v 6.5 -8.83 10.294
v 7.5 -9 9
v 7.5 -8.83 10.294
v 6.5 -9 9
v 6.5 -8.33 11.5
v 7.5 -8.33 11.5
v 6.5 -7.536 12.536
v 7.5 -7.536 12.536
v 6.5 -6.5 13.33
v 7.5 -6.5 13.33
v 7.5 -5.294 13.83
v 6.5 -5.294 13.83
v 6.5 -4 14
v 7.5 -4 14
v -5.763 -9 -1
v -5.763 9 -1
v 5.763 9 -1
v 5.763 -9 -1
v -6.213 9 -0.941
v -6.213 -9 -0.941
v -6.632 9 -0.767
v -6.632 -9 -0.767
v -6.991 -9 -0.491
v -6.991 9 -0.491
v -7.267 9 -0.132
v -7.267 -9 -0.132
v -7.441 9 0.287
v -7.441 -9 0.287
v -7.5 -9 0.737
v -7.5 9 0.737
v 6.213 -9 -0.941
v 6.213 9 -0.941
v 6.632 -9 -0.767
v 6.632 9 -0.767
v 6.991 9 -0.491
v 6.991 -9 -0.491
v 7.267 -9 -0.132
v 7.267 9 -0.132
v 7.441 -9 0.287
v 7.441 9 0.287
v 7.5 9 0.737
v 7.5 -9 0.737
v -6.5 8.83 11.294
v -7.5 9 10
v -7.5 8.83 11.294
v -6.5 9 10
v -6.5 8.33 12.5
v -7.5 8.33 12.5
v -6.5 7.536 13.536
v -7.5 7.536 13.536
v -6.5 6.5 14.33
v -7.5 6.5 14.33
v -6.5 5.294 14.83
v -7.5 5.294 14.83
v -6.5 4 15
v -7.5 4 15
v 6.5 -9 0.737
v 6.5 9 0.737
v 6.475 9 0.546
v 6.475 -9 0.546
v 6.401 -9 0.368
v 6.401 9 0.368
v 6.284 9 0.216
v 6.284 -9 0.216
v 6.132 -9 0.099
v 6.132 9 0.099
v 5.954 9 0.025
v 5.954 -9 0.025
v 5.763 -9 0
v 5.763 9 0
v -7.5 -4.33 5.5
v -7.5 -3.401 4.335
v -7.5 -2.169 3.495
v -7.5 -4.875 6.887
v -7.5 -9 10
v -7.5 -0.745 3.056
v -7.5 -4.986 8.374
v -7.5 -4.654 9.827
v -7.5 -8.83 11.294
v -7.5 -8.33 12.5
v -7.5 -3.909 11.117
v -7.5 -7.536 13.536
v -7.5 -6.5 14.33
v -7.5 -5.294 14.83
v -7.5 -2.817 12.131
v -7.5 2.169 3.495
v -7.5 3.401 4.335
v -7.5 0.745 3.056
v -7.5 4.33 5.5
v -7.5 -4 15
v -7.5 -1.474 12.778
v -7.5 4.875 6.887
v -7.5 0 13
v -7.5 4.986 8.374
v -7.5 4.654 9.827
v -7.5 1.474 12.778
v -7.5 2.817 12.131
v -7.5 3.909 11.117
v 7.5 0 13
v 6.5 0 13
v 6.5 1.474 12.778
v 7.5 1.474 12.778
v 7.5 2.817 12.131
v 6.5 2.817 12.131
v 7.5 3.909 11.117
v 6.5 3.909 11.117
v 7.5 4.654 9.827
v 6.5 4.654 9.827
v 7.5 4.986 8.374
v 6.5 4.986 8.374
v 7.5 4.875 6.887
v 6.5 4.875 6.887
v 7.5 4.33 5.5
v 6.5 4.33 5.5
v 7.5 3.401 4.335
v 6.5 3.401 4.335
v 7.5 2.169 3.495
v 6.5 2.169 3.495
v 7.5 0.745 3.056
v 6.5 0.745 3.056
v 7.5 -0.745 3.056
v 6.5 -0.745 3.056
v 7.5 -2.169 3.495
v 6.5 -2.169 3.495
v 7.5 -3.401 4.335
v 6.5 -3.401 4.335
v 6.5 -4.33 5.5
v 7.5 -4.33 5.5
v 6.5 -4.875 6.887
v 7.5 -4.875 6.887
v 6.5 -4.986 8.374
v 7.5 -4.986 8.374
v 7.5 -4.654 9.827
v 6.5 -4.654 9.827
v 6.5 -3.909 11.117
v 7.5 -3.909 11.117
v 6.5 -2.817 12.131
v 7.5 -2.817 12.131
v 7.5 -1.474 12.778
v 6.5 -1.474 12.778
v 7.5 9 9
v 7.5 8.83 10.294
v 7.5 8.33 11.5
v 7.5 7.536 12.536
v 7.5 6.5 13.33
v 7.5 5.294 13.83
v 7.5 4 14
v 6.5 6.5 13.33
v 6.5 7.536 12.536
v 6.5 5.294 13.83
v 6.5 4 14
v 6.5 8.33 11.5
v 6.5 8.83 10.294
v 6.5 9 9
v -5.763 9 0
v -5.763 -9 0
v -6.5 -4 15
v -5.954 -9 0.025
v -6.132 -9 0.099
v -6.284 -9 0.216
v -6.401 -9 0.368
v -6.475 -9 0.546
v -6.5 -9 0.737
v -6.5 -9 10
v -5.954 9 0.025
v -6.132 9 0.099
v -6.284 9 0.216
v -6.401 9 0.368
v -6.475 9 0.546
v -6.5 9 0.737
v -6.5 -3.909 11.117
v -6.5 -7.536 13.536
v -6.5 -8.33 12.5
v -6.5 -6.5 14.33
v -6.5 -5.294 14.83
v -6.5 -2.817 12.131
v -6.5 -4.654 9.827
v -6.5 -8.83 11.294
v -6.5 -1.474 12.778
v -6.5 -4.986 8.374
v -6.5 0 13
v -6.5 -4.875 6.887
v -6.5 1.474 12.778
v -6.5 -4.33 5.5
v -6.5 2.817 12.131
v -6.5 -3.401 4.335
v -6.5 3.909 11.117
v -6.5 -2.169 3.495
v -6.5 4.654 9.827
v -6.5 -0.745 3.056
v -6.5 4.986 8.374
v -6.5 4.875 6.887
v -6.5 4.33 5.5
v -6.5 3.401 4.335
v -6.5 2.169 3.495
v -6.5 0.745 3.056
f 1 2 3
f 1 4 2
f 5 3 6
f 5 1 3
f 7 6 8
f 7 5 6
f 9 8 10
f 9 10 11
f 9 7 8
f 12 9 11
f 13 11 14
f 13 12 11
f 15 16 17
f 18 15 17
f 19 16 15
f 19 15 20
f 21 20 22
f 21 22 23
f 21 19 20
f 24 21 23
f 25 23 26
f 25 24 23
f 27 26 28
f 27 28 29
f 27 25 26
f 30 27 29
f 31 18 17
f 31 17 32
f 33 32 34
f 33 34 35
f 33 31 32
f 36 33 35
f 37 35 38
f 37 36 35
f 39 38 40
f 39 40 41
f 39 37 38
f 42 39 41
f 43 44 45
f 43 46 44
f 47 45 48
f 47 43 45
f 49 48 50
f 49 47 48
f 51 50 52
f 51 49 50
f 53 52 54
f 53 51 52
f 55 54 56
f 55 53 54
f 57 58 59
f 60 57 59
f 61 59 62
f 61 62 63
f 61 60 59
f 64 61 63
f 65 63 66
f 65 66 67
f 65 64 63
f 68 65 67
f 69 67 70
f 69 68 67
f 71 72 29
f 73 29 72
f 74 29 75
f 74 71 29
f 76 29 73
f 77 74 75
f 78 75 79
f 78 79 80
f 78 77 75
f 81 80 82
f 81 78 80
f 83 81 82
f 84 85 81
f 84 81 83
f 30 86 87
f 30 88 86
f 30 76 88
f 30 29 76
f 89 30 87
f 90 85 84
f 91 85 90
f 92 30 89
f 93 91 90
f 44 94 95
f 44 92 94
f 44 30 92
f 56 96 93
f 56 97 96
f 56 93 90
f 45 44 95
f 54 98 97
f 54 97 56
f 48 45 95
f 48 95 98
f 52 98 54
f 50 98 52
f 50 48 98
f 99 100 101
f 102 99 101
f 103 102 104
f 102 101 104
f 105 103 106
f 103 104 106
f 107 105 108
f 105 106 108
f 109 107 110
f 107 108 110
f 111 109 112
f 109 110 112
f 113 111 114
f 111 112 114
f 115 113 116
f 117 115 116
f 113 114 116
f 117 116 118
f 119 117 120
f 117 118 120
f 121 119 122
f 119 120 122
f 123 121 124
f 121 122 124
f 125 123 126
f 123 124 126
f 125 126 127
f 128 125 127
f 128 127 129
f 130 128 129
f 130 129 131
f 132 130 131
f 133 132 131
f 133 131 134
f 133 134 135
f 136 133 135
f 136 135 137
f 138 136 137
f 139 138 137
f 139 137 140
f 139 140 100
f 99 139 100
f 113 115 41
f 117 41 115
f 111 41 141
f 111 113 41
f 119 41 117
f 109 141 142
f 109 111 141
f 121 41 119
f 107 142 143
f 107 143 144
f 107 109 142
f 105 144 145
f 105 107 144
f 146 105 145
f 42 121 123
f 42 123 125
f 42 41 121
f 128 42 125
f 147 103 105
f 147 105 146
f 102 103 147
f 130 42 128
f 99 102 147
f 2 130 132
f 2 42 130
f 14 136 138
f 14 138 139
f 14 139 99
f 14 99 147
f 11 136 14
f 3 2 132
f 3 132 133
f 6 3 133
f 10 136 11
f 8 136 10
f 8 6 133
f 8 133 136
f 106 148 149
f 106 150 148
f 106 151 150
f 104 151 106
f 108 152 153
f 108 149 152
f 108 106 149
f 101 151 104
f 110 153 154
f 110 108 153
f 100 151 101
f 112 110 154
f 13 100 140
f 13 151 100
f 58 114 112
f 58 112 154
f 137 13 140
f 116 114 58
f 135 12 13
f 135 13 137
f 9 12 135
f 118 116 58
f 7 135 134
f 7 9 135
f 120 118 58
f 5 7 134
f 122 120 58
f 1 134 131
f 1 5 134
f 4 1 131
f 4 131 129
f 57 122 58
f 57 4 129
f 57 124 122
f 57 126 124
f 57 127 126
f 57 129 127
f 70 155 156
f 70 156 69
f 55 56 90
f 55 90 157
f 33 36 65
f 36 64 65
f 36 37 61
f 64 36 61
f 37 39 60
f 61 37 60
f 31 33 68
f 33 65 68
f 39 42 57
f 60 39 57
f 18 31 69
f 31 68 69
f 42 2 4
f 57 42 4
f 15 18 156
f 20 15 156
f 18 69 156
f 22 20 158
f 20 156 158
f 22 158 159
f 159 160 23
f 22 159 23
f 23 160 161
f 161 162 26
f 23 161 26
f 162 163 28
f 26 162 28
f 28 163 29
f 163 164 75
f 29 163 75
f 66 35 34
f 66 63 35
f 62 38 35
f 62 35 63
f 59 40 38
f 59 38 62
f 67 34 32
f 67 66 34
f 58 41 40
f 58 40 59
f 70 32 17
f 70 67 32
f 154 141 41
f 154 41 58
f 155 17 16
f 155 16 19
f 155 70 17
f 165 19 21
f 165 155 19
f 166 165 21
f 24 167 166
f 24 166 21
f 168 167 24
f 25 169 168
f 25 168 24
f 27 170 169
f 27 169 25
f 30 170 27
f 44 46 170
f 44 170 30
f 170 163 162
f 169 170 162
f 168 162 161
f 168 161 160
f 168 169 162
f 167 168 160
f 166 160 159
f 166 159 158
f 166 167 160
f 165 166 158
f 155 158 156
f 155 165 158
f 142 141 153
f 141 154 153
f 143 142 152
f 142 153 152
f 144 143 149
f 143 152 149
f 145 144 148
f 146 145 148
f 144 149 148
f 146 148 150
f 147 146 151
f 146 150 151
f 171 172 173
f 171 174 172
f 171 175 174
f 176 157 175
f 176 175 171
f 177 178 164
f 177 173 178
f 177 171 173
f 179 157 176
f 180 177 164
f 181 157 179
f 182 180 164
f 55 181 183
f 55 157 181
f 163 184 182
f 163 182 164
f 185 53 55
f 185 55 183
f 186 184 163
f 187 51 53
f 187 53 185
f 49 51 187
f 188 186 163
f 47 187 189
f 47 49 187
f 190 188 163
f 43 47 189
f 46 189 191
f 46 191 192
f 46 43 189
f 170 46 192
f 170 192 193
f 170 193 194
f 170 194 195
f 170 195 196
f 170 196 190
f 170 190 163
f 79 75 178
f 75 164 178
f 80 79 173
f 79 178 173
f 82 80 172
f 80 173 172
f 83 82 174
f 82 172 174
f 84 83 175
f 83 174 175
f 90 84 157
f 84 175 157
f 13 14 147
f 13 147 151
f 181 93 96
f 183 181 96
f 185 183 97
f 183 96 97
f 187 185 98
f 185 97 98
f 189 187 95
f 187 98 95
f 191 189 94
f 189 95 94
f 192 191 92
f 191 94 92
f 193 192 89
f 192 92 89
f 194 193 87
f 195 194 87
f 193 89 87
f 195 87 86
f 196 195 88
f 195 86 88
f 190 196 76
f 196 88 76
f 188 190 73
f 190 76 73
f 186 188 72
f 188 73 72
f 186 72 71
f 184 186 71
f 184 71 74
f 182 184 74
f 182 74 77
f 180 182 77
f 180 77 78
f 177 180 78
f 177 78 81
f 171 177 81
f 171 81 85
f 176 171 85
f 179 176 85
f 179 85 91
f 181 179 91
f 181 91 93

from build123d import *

# Parameters (mm, degrees)
SKETCH2_W                    = 15
SKETCH2_H                    = 18
BASE_FLANGE1_DEPTH           = 1
EDGE_FLANGE1_STRIP_W         = 5.4732
EDGE_FLANGE1_STRIP_H         = 1
EDGE_FLANGE1_STRIP_CUT_DEPTH = 18
EDGE_FLANGE1_DEPTH           = 18
EDGE_FLANGE2_STRIP_W         = 5.4732
EDGE_FLANGE2_STRIP_H         = 1
EDGE_FLANGE2_STRIP_CUT_DEPTH = 18
EDGE_FLANGE2_DEPTH           = 18
SKETCH13_R                   = 5
CUT_EXTRUDE1_DEPTH           = 24.043437244
FILLET1_R                    = 5


# Sheet-metal steps are written as plain solids
with BuildPart() as part:
    # Sketch2 → Base-Flange1 (new body)
    with BuildSketch(Plane.XY):
        Rectangle(SKETCH2_W, SKETCH2_H)
    extrude(amount=-BASE_FLANGE1_DEPTH)

    # Edge-Flange1 strip (across the edge) → Edge-Flange1 strip cut (cut)
    with BuildSketch(Plane(origin=(7.5, -9, 0), x_dir=(-1, 0, 0), z_dir=(0, 1, 0))):
        with Locations((-1, -0.5)):
            Rectangle(EDGE_FLANGE1_STRIP_W, EDGE_FLANGE1_STRIP_H)
    extrude(amount=EDGE_FLANGE1_STRIP_CUT_DEPTH, mode=Mode.SUBTRACT)

    # Edge-Flange1 section (across the edge) → Edge-Flange1 (add)
    with BuildSketch(Plane(origin=(7.5, -9, 0), x_dir=(-1, 0, 0), z_dir=(0, 1, 0))):
        with BuildLine():
            Line((0, 0.7366), (0, 14))
            Line((0, 14), (1, 14))
            Line((1, 14), (1, 0.7366))
            ThreePointArc((1, 0.7366), (1.215745145, 0.215745145), (1.7366, 0))
            Line((1.7366, 0), (1.7366, -1))
            ThreePointArc((1.7366, -1), (0.508638364, -0.491361636), (0, 0.7366))
        make_face()
    extrude(amount=EDGE_FLANGE1_DEPTH)

    # Edge-Flange2 strip (across the edge) → Edge-Flange2 strip cut (cut)
    with BuildSketch(Plane(origin=(-7.5, 9, 0), x_dir=(1, 0, 0), z_dir=(0, -1, 0))):
        with Locations((-1, -0.5)):
            Rectangle(EDGE_FLANGE2_STRIP_W, EDGE_FLANGE2_STRIP_H)
    extrude(amount=EDGE_FLANGE2_STRIP_CUT_DEPTH, mode=Mode.SUBTRACT)

    # Edge-Flange2 section (across the edge) → Edge-Flange2 (add)
    with BuildSketch(Plane(origin=(-7.5, 9, 0), x_dir=(1, 0, 0), z_dir=(0, -1, 0))):
        with BuildLine():
            Line((0, 0.7366), (0, 15))
            Line((0, 15), (1, 15))
            Line((1, 15), (1, 0.7366))
            ThreePointArc((1, 0.7366), (1.215745145, 0.215745145), (1.7366, 0))
            Line((1.7366, 0), (1.7366, -1))
            ThreePointArc((1.7366, -1), (0.508638364, -0.491361636), (0, 0.7366))
        make_face()
    extrude(amount=EDGE_FLANGE2_DEPTH)

    # Sketch13 → Cut-Extrude1 (cut, through all)
    with BuildSketch(Plane.ZY.offset(7.5)):
        with Locations((8, 0)):
            Circle(SKETCH13_R)
    extrude(amount=-CUT_EXTRUDE1_DEPTH, mode=Mode.SUBTRACT)

    # Fillet1
    fillet1_edges = [part.edges().sort_by_distance(p)[0] for p in [
        (7, -9, 14),
        (7, 9, 14),
        (-7, 9, 15),
        (-7, -9, 15),
    ]]
    fillet(fillet1_edges, radius=FILLET1_R)


solid = part.part
